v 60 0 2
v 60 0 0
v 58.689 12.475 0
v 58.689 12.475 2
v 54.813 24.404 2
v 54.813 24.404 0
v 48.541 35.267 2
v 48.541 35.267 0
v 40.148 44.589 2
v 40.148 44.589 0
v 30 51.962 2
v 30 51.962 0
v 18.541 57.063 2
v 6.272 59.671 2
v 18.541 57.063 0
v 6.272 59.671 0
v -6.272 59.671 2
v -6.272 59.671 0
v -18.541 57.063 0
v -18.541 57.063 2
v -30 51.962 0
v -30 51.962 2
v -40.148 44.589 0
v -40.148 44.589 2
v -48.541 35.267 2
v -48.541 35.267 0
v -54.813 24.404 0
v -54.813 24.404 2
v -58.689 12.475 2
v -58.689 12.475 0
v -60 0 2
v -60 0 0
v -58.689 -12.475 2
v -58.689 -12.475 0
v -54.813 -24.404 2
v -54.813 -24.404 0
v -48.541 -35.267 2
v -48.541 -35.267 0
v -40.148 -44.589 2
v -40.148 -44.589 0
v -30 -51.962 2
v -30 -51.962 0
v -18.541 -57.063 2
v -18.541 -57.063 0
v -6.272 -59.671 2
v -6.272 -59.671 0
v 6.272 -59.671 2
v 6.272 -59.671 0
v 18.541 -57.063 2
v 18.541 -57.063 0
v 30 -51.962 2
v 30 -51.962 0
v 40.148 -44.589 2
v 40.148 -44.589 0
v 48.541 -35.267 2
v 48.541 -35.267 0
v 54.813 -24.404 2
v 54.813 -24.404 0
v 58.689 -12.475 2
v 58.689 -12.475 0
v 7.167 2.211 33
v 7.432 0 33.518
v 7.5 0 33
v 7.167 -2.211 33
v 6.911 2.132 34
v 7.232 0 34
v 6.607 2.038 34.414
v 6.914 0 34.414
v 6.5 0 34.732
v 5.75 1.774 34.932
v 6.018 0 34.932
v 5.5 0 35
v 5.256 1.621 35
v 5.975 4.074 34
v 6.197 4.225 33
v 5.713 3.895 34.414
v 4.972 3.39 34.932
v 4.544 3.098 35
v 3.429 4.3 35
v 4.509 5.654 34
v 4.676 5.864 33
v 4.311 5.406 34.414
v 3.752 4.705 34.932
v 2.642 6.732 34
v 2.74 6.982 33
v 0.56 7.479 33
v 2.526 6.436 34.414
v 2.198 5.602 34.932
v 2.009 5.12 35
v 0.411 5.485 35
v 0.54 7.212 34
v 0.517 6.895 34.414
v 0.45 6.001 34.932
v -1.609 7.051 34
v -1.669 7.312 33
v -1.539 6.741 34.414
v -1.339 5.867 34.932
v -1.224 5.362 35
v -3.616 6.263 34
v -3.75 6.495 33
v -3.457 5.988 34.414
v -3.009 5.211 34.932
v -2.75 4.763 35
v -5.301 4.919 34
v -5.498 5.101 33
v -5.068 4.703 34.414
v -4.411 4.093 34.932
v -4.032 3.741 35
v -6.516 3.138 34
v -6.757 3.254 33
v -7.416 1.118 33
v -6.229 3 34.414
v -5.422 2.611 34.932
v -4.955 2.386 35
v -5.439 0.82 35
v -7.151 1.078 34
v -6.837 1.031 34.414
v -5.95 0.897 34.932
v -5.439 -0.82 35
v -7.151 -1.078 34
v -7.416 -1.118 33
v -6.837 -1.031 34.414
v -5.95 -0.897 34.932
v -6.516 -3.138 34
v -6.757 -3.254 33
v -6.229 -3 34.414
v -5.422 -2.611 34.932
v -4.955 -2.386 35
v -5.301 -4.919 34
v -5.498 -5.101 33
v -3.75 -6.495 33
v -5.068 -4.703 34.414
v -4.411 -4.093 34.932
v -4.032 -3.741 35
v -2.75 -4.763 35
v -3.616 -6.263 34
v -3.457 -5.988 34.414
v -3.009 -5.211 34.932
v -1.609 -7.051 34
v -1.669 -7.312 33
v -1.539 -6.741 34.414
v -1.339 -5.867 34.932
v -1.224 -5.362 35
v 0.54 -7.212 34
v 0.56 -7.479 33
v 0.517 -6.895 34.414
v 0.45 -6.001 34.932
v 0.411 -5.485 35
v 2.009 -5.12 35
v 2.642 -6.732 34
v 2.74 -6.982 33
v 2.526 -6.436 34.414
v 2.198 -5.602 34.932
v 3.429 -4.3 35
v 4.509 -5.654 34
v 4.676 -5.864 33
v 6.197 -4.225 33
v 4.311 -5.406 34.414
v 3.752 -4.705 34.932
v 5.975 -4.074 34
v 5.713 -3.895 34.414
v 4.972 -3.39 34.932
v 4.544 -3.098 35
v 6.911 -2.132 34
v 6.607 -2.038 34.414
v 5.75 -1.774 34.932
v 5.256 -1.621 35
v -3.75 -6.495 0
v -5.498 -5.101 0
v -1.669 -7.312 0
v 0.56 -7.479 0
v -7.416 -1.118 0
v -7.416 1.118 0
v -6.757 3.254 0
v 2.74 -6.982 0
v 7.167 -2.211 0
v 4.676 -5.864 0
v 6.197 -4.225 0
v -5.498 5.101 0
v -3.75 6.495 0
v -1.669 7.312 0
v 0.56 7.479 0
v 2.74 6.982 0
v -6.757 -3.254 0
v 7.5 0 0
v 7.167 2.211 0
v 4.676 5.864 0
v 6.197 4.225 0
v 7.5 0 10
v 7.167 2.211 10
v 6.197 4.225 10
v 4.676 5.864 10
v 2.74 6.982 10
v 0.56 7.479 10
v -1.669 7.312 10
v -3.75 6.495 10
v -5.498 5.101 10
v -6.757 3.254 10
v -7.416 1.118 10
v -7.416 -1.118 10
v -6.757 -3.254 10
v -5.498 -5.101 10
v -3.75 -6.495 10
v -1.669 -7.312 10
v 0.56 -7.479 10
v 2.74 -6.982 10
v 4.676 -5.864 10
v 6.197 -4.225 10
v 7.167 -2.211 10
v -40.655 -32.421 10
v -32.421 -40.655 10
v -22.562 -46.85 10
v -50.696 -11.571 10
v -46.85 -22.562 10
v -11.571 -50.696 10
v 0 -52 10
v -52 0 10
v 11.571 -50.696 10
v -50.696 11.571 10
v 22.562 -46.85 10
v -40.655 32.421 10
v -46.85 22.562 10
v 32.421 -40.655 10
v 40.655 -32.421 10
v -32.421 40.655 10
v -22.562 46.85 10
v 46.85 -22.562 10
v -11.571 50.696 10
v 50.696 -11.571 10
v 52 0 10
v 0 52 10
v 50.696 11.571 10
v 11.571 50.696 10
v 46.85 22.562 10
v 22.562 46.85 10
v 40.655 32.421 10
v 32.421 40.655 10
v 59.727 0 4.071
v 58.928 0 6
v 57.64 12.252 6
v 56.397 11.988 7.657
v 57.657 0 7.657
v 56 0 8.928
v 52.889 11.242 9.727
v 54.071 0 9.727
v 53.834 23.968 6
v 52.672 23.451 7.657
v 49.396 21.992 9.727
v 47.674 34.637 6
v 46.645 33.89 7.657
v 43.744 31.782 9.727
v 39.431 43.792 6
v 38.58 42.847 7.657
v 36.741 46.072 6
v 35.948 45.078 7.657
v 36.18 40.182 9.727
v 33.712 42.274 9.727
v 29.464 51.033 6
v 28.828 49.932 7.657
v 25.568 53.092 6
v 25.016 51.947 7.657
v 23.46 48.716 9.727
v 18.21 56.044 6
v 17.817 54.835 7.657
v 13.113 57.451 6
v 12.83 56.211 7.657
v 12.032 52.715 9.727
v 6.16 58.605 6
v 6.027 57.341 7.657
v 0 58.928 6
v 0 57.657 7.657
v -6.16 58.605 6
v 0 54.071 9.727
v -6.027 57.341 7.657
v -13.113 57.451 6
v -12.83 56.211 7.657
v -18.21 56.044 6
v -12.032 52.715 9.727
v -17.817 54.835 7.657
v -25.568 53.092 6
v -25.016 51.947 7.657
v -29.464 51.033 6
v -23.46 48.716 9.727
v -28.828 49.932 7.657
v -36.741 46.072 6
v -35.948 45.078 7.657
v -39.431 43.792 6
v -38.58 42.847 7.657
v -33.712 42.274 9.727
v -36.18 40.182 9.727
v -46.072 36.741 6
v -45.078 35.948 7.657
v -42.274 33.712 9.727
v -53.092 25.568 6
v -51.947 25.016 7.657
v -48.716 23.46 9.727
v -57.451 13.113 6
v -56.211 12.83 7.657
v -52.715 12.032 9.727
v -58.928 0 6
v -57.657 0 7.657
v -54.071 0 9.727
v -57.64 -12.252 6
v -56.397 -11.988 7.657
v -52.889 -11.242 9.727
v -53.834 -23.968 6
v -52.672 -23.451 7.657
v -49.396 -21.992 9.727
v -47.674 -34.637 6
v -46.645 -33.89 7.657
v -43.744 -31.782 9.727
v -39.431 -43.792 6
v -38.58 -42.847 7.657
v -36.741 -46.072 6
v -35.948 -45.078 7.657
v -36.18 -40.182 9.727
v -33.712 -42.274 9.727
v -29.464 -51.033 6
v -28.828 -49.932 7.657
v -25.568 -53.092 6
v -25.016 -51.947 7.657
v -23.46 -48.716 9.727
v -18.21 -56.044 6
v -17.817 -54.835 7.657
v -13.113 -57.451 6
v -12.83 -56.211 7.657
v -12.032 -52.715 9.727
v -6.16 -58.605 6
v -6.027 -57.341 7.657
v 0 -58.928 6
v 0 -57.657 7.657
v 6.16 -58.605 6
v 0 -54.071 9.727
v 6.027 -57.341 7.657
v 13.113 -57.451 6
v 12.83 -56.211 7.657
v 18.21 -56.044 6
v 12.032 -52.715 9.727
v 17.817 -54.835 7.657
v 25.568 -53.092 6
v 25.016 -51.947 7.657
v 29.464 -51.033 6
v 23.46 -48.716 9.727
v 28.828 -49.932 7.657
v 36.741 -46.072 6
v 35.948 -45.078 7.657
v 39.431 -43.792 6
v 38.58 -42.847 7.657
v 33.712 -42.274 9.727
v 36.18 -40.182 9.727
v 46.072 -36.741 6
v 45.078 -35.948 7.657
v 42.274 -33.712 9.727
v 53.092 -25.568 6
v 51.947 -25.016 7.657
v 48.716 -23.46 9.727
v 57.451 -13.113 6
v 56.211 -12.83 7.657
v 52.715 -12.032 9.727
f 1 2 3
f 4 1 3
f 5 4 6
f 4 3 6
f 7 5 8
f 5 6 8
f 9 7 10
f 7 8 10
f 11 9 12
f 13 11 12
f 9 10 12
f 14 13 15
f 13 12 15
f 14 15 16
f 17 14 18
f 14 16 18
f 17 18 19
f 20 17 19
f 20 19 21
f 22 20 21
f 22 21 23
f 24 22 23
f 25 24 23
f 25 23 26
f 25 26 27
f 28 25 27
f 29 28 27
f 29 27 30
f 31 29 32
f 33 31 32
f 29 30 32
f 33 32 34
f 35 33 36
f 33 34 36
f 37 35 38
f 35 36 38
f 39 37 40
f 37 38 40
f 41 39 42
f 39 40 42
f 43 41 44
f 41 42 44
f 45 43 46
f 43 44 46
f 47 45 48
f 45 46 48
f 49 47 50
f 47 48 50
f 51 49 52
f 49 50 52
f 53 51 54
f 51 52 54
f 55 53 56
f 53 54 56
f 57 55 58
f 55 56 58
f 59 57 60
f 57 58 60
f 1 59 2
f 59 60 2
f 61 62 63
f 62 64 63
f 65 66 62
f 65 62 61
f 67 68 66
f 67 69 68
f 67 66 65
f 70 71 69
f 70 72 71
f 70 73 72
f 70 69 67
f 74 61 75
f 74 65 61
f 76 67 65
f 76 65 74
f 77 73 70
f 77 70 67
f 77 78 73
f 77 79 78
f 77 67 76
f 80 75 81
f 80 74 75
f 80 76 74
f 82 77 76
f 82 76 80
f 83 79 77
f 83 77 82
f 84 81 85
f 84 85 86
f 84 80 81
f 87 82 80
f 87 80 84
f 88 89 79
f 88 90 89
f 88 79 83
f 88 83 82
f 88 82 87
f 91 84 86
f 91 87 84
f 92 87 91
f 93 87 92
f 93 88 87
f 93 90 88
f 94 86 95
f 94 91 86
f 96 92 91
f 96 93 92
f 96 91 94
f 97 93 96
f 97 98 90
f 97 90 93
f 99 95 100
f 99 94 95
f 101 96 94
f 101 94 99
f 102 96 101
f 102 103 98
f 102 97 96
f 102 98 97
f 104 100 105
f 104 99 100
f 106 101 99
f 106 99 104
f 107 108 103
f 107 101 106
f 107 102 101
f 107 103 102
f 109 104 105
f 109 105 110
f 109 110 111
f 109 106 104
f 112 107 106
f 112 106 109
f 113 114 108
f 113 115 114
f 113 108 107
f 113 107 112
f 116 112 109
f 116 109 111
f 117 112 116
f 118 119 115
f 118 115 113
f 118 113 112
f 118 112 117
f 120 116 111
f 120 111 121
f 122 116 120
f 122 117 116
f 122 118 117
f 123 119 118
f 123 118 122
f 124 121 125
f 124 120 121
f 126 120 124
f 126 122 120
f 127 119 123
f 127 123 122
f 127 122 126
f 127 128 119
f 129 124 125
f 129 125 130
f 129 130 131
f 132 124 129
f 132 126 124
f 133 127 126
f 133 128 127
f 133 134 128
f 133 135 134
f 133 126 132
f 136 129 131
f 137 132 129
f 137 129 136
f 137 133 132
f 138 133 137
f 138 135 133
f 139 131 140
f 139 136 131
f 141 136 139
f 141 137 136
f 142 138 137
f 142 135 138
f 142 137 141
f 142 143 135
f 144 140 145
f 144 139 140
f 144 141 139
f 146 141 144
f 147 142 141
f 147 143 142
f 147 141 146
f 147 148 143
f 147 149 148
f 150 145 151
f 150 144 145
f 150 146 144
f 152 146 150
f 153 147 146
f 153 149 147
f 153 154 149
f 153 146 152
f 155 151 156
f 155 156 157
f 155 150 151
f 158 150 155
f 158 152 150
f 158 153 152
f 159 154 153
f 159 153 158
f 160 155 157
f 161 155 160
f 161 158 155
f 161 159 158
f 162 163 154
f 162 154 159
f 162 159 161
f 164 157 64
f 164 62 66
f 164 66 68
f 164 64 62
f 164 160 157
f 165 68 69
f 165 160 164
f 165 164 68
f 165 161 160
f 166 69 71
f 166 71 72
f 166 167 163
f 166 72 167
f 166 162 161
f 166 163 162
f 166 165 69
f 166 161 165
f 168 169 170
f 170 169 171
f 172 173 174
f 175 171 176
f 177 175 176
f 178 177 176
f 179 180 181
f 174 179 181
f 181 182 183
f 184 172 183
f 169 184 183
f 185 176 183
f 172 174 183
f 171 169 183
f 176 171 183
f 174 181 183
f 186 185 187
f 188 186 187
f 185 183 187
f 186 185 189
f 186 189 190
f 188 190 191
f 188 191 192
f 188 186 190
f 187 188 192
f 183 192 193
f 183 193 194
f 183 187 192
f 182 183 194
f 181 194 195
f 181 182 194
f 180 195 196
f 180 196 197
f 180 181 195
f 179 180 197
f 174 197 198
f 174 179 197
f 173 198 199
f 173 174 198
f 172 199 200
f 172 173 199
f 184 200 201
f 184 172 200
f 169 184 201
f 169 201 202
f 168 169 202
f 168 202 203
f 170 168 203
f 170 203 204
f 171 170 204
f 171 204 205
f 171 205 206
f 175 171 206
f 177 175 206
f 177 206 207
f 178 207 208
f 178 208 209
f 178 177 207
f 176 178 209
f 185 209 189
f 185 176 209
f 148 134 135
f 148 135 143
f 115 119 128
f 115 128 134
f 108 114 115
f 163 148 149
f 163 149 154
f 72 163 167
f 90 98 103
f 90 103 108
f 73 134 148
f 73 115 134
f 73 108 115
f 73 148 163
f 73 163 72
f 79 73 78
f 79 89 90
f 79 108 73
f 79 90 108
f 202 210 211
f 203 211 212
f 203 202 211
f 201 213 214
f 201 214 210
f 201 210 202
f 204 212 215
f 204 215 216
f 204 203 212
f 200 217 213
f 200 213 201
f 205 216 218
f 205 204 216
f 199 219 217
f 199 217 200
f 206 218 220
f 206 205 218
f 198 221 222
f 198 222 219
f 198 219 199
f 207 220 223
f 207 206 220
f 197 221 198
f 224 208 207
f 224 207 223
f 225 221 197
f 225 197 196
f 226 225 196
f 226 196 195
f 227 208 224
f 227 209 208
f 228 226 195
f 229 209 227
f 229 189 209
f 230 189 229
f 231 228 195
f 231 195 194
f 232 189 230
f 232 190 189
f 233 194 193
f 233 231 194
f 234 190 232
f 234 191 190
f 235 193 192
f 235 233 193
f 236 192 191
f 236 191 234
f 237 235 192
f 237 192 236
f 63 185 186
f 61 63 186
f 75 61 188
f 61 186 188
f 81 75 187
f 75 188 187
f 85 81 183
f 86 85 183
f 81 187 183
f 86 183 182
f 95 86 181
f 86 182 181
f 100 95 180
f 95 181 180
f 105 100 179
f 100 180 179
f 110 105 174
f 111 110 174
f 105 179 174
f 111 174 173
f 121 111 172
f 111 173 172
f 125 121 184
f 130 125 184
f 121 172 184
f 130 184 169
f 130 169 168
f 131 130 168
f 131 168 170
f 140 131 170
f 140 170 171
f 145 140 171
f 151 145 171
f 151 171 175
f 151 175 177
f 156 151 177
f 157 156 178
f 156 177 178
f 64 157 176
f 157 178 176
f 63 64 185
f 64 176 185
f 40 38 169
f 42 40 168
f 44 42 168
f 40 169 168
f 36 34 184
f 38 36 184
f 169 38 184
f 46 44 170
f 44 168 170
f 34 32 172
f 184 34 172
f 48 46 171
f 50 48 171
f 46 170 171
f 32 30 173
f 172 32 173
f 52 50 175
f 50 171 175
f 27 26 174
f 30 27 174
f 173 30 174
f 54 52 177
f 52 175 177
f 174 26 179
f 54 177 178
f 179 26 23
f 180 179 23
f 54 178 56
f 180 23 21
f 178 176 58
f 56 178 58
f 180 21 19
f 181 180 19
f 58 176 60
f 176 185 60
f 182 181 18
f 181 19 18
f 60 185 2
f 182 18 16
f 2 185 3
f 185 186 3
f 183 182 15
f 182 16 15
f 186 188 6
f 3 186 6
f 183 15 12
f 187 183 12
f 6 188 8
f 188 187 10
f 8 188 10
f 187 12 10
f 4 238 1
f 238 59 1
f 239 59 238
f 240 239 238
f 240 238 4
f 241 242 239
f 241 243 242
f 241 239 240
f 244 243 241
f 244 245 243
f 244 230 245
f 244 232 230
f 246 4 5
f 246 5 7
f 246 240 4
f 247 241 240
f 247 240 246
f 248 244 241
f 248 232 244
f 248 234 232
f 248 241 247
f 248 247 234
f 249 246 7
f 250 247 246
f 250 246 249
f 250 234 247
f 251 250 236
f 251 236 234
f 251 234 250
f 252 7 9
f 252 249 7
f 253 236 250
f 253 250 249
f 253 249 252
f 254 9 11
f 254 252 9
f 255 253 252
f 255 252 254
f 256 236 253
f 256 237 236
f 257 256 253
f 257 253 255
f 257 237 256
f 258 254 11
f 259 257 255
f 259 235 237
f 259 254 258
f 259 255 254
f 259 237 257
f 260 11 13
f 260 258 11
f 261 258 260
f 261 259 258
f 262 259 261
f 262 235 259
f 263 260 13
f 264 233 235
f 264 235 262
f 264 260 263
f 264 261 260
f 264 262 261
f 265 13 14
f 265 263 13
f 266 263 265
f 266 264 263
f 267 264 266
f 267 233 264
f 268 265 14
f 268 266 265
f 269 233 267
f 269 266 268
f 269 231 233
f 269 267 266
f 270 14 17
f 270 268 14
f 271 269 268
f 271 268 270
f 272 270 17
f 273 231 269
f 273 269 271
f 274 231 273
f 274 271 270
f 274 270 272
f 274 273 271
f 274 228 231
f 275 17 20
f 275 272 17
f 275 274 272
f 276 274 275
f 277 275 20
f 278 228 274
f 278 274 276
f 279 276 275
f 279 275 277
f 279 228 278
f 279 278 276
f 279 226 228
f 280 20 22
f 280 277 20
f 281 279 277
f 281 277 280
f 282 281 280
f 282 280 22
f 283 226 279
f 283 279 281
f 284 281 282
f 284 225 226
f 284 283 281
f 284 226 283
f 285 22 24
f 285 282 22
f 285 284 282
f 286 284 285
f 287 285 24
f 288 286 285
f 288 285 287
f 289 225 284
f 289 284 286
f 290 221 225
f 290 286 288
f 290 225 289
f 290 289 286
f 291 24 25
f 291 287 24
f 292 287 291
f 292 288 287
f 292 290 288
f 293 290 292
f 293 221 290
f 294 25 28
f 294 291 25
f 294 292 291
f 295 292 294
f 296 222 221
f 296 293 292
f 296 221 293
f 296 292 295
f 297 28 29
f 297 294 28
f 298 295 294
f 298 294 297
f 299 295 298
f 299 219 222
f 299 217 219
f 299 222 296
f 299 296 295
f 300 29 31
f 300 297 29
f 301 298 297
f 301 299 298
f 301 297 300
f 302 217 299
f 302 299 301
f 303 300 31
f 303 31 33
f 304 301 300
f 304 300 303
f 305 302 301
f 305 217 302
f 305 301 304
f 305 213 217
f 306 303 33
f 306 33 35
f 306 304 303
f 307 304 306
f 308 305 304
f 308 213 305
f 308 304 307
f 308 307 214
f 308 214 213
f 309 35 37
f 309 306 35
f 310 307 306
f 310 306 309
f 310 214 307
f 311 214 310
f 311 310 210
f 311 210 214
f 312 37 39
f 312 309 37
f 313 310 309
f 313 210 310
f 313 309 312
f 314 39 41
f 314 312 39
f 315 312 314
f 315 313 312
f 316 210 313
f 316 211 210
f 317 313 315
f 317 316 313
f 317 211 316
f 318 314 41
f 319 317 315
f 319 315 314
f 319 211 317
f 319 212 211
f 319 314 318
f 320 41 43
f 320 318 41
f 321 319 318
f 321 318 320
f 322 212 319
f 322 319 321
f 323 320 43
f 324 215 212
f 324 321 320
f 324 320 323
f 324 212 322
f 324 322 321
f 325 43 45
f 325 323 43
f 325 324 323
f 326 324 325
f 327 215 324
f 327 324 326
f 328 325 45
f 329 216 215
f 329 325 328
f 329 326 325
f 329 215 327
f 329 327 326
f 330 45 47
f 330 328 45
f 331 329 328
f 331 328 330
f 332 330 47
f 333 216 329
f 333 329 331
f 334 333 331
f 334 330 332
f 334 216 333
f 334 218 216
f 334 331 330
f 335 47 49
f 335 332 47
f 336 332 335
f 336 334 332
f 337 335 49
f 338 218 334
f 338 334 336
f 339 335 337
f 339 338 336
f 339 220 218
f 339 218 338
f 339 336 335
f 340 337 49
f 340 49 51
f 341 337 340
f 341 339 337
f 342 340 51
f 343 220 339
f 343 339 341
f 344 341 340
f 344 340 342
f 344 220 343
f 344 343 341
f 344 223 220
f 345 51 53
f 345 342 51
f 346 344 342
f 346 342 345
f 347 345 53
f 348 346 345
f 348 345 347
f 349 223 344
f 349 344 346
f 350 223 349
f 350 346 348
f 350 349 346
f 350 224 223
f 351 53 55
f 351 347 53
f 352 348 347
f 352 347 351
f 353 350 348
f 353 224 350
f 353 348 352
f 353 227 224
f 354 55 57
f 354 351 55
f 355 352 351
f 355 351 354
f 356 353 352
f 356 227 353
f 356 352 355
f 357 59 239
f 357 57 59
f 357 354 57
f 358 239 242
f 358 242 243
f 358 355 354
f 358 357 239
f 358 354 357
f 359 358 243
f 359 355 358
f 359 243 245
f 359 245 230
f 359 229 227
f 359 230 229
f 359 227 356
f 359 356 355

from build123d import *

# Parameters (mm, degrees)
F0_R     = 7.5
F1_DEPTH = 35
F0_R_2   = 60
F2_DEPTH = 10
F3_R     = 2
F4_R     = 8


with BuildPart() as f1:
    # F0 (on Top) → F1 (new body)
    with BuildSketch(Plane.XY):
        Circle(F0_R)
    extrude(amount=F1_DEPTH)

    # F3
    f3_edges = [f1.edges().sort_by_distance(p)[0] for p in [
        (-7.5, 0, 35),
    ]]
    fillet(f3_edges, radius=F3_R)


with BuildPart() as f2:
    # F0 (on Top) → F2 (new body)
    with BuildSketch(Plane.XY):
        Circle(F0_R_2)
        Circle(F0_R, mode=Mode.SUBTRACT)
    extrude(amount=F2_DEPTH)

    # F4
    f4_edges = [f2.edges().sort_by_distance(p)[0] for p in [
        (-60, 0, 10),
    ]]
    fillet(f4_edges, radius=F4_R)


solid = Compound([f1.part, f2.part])
